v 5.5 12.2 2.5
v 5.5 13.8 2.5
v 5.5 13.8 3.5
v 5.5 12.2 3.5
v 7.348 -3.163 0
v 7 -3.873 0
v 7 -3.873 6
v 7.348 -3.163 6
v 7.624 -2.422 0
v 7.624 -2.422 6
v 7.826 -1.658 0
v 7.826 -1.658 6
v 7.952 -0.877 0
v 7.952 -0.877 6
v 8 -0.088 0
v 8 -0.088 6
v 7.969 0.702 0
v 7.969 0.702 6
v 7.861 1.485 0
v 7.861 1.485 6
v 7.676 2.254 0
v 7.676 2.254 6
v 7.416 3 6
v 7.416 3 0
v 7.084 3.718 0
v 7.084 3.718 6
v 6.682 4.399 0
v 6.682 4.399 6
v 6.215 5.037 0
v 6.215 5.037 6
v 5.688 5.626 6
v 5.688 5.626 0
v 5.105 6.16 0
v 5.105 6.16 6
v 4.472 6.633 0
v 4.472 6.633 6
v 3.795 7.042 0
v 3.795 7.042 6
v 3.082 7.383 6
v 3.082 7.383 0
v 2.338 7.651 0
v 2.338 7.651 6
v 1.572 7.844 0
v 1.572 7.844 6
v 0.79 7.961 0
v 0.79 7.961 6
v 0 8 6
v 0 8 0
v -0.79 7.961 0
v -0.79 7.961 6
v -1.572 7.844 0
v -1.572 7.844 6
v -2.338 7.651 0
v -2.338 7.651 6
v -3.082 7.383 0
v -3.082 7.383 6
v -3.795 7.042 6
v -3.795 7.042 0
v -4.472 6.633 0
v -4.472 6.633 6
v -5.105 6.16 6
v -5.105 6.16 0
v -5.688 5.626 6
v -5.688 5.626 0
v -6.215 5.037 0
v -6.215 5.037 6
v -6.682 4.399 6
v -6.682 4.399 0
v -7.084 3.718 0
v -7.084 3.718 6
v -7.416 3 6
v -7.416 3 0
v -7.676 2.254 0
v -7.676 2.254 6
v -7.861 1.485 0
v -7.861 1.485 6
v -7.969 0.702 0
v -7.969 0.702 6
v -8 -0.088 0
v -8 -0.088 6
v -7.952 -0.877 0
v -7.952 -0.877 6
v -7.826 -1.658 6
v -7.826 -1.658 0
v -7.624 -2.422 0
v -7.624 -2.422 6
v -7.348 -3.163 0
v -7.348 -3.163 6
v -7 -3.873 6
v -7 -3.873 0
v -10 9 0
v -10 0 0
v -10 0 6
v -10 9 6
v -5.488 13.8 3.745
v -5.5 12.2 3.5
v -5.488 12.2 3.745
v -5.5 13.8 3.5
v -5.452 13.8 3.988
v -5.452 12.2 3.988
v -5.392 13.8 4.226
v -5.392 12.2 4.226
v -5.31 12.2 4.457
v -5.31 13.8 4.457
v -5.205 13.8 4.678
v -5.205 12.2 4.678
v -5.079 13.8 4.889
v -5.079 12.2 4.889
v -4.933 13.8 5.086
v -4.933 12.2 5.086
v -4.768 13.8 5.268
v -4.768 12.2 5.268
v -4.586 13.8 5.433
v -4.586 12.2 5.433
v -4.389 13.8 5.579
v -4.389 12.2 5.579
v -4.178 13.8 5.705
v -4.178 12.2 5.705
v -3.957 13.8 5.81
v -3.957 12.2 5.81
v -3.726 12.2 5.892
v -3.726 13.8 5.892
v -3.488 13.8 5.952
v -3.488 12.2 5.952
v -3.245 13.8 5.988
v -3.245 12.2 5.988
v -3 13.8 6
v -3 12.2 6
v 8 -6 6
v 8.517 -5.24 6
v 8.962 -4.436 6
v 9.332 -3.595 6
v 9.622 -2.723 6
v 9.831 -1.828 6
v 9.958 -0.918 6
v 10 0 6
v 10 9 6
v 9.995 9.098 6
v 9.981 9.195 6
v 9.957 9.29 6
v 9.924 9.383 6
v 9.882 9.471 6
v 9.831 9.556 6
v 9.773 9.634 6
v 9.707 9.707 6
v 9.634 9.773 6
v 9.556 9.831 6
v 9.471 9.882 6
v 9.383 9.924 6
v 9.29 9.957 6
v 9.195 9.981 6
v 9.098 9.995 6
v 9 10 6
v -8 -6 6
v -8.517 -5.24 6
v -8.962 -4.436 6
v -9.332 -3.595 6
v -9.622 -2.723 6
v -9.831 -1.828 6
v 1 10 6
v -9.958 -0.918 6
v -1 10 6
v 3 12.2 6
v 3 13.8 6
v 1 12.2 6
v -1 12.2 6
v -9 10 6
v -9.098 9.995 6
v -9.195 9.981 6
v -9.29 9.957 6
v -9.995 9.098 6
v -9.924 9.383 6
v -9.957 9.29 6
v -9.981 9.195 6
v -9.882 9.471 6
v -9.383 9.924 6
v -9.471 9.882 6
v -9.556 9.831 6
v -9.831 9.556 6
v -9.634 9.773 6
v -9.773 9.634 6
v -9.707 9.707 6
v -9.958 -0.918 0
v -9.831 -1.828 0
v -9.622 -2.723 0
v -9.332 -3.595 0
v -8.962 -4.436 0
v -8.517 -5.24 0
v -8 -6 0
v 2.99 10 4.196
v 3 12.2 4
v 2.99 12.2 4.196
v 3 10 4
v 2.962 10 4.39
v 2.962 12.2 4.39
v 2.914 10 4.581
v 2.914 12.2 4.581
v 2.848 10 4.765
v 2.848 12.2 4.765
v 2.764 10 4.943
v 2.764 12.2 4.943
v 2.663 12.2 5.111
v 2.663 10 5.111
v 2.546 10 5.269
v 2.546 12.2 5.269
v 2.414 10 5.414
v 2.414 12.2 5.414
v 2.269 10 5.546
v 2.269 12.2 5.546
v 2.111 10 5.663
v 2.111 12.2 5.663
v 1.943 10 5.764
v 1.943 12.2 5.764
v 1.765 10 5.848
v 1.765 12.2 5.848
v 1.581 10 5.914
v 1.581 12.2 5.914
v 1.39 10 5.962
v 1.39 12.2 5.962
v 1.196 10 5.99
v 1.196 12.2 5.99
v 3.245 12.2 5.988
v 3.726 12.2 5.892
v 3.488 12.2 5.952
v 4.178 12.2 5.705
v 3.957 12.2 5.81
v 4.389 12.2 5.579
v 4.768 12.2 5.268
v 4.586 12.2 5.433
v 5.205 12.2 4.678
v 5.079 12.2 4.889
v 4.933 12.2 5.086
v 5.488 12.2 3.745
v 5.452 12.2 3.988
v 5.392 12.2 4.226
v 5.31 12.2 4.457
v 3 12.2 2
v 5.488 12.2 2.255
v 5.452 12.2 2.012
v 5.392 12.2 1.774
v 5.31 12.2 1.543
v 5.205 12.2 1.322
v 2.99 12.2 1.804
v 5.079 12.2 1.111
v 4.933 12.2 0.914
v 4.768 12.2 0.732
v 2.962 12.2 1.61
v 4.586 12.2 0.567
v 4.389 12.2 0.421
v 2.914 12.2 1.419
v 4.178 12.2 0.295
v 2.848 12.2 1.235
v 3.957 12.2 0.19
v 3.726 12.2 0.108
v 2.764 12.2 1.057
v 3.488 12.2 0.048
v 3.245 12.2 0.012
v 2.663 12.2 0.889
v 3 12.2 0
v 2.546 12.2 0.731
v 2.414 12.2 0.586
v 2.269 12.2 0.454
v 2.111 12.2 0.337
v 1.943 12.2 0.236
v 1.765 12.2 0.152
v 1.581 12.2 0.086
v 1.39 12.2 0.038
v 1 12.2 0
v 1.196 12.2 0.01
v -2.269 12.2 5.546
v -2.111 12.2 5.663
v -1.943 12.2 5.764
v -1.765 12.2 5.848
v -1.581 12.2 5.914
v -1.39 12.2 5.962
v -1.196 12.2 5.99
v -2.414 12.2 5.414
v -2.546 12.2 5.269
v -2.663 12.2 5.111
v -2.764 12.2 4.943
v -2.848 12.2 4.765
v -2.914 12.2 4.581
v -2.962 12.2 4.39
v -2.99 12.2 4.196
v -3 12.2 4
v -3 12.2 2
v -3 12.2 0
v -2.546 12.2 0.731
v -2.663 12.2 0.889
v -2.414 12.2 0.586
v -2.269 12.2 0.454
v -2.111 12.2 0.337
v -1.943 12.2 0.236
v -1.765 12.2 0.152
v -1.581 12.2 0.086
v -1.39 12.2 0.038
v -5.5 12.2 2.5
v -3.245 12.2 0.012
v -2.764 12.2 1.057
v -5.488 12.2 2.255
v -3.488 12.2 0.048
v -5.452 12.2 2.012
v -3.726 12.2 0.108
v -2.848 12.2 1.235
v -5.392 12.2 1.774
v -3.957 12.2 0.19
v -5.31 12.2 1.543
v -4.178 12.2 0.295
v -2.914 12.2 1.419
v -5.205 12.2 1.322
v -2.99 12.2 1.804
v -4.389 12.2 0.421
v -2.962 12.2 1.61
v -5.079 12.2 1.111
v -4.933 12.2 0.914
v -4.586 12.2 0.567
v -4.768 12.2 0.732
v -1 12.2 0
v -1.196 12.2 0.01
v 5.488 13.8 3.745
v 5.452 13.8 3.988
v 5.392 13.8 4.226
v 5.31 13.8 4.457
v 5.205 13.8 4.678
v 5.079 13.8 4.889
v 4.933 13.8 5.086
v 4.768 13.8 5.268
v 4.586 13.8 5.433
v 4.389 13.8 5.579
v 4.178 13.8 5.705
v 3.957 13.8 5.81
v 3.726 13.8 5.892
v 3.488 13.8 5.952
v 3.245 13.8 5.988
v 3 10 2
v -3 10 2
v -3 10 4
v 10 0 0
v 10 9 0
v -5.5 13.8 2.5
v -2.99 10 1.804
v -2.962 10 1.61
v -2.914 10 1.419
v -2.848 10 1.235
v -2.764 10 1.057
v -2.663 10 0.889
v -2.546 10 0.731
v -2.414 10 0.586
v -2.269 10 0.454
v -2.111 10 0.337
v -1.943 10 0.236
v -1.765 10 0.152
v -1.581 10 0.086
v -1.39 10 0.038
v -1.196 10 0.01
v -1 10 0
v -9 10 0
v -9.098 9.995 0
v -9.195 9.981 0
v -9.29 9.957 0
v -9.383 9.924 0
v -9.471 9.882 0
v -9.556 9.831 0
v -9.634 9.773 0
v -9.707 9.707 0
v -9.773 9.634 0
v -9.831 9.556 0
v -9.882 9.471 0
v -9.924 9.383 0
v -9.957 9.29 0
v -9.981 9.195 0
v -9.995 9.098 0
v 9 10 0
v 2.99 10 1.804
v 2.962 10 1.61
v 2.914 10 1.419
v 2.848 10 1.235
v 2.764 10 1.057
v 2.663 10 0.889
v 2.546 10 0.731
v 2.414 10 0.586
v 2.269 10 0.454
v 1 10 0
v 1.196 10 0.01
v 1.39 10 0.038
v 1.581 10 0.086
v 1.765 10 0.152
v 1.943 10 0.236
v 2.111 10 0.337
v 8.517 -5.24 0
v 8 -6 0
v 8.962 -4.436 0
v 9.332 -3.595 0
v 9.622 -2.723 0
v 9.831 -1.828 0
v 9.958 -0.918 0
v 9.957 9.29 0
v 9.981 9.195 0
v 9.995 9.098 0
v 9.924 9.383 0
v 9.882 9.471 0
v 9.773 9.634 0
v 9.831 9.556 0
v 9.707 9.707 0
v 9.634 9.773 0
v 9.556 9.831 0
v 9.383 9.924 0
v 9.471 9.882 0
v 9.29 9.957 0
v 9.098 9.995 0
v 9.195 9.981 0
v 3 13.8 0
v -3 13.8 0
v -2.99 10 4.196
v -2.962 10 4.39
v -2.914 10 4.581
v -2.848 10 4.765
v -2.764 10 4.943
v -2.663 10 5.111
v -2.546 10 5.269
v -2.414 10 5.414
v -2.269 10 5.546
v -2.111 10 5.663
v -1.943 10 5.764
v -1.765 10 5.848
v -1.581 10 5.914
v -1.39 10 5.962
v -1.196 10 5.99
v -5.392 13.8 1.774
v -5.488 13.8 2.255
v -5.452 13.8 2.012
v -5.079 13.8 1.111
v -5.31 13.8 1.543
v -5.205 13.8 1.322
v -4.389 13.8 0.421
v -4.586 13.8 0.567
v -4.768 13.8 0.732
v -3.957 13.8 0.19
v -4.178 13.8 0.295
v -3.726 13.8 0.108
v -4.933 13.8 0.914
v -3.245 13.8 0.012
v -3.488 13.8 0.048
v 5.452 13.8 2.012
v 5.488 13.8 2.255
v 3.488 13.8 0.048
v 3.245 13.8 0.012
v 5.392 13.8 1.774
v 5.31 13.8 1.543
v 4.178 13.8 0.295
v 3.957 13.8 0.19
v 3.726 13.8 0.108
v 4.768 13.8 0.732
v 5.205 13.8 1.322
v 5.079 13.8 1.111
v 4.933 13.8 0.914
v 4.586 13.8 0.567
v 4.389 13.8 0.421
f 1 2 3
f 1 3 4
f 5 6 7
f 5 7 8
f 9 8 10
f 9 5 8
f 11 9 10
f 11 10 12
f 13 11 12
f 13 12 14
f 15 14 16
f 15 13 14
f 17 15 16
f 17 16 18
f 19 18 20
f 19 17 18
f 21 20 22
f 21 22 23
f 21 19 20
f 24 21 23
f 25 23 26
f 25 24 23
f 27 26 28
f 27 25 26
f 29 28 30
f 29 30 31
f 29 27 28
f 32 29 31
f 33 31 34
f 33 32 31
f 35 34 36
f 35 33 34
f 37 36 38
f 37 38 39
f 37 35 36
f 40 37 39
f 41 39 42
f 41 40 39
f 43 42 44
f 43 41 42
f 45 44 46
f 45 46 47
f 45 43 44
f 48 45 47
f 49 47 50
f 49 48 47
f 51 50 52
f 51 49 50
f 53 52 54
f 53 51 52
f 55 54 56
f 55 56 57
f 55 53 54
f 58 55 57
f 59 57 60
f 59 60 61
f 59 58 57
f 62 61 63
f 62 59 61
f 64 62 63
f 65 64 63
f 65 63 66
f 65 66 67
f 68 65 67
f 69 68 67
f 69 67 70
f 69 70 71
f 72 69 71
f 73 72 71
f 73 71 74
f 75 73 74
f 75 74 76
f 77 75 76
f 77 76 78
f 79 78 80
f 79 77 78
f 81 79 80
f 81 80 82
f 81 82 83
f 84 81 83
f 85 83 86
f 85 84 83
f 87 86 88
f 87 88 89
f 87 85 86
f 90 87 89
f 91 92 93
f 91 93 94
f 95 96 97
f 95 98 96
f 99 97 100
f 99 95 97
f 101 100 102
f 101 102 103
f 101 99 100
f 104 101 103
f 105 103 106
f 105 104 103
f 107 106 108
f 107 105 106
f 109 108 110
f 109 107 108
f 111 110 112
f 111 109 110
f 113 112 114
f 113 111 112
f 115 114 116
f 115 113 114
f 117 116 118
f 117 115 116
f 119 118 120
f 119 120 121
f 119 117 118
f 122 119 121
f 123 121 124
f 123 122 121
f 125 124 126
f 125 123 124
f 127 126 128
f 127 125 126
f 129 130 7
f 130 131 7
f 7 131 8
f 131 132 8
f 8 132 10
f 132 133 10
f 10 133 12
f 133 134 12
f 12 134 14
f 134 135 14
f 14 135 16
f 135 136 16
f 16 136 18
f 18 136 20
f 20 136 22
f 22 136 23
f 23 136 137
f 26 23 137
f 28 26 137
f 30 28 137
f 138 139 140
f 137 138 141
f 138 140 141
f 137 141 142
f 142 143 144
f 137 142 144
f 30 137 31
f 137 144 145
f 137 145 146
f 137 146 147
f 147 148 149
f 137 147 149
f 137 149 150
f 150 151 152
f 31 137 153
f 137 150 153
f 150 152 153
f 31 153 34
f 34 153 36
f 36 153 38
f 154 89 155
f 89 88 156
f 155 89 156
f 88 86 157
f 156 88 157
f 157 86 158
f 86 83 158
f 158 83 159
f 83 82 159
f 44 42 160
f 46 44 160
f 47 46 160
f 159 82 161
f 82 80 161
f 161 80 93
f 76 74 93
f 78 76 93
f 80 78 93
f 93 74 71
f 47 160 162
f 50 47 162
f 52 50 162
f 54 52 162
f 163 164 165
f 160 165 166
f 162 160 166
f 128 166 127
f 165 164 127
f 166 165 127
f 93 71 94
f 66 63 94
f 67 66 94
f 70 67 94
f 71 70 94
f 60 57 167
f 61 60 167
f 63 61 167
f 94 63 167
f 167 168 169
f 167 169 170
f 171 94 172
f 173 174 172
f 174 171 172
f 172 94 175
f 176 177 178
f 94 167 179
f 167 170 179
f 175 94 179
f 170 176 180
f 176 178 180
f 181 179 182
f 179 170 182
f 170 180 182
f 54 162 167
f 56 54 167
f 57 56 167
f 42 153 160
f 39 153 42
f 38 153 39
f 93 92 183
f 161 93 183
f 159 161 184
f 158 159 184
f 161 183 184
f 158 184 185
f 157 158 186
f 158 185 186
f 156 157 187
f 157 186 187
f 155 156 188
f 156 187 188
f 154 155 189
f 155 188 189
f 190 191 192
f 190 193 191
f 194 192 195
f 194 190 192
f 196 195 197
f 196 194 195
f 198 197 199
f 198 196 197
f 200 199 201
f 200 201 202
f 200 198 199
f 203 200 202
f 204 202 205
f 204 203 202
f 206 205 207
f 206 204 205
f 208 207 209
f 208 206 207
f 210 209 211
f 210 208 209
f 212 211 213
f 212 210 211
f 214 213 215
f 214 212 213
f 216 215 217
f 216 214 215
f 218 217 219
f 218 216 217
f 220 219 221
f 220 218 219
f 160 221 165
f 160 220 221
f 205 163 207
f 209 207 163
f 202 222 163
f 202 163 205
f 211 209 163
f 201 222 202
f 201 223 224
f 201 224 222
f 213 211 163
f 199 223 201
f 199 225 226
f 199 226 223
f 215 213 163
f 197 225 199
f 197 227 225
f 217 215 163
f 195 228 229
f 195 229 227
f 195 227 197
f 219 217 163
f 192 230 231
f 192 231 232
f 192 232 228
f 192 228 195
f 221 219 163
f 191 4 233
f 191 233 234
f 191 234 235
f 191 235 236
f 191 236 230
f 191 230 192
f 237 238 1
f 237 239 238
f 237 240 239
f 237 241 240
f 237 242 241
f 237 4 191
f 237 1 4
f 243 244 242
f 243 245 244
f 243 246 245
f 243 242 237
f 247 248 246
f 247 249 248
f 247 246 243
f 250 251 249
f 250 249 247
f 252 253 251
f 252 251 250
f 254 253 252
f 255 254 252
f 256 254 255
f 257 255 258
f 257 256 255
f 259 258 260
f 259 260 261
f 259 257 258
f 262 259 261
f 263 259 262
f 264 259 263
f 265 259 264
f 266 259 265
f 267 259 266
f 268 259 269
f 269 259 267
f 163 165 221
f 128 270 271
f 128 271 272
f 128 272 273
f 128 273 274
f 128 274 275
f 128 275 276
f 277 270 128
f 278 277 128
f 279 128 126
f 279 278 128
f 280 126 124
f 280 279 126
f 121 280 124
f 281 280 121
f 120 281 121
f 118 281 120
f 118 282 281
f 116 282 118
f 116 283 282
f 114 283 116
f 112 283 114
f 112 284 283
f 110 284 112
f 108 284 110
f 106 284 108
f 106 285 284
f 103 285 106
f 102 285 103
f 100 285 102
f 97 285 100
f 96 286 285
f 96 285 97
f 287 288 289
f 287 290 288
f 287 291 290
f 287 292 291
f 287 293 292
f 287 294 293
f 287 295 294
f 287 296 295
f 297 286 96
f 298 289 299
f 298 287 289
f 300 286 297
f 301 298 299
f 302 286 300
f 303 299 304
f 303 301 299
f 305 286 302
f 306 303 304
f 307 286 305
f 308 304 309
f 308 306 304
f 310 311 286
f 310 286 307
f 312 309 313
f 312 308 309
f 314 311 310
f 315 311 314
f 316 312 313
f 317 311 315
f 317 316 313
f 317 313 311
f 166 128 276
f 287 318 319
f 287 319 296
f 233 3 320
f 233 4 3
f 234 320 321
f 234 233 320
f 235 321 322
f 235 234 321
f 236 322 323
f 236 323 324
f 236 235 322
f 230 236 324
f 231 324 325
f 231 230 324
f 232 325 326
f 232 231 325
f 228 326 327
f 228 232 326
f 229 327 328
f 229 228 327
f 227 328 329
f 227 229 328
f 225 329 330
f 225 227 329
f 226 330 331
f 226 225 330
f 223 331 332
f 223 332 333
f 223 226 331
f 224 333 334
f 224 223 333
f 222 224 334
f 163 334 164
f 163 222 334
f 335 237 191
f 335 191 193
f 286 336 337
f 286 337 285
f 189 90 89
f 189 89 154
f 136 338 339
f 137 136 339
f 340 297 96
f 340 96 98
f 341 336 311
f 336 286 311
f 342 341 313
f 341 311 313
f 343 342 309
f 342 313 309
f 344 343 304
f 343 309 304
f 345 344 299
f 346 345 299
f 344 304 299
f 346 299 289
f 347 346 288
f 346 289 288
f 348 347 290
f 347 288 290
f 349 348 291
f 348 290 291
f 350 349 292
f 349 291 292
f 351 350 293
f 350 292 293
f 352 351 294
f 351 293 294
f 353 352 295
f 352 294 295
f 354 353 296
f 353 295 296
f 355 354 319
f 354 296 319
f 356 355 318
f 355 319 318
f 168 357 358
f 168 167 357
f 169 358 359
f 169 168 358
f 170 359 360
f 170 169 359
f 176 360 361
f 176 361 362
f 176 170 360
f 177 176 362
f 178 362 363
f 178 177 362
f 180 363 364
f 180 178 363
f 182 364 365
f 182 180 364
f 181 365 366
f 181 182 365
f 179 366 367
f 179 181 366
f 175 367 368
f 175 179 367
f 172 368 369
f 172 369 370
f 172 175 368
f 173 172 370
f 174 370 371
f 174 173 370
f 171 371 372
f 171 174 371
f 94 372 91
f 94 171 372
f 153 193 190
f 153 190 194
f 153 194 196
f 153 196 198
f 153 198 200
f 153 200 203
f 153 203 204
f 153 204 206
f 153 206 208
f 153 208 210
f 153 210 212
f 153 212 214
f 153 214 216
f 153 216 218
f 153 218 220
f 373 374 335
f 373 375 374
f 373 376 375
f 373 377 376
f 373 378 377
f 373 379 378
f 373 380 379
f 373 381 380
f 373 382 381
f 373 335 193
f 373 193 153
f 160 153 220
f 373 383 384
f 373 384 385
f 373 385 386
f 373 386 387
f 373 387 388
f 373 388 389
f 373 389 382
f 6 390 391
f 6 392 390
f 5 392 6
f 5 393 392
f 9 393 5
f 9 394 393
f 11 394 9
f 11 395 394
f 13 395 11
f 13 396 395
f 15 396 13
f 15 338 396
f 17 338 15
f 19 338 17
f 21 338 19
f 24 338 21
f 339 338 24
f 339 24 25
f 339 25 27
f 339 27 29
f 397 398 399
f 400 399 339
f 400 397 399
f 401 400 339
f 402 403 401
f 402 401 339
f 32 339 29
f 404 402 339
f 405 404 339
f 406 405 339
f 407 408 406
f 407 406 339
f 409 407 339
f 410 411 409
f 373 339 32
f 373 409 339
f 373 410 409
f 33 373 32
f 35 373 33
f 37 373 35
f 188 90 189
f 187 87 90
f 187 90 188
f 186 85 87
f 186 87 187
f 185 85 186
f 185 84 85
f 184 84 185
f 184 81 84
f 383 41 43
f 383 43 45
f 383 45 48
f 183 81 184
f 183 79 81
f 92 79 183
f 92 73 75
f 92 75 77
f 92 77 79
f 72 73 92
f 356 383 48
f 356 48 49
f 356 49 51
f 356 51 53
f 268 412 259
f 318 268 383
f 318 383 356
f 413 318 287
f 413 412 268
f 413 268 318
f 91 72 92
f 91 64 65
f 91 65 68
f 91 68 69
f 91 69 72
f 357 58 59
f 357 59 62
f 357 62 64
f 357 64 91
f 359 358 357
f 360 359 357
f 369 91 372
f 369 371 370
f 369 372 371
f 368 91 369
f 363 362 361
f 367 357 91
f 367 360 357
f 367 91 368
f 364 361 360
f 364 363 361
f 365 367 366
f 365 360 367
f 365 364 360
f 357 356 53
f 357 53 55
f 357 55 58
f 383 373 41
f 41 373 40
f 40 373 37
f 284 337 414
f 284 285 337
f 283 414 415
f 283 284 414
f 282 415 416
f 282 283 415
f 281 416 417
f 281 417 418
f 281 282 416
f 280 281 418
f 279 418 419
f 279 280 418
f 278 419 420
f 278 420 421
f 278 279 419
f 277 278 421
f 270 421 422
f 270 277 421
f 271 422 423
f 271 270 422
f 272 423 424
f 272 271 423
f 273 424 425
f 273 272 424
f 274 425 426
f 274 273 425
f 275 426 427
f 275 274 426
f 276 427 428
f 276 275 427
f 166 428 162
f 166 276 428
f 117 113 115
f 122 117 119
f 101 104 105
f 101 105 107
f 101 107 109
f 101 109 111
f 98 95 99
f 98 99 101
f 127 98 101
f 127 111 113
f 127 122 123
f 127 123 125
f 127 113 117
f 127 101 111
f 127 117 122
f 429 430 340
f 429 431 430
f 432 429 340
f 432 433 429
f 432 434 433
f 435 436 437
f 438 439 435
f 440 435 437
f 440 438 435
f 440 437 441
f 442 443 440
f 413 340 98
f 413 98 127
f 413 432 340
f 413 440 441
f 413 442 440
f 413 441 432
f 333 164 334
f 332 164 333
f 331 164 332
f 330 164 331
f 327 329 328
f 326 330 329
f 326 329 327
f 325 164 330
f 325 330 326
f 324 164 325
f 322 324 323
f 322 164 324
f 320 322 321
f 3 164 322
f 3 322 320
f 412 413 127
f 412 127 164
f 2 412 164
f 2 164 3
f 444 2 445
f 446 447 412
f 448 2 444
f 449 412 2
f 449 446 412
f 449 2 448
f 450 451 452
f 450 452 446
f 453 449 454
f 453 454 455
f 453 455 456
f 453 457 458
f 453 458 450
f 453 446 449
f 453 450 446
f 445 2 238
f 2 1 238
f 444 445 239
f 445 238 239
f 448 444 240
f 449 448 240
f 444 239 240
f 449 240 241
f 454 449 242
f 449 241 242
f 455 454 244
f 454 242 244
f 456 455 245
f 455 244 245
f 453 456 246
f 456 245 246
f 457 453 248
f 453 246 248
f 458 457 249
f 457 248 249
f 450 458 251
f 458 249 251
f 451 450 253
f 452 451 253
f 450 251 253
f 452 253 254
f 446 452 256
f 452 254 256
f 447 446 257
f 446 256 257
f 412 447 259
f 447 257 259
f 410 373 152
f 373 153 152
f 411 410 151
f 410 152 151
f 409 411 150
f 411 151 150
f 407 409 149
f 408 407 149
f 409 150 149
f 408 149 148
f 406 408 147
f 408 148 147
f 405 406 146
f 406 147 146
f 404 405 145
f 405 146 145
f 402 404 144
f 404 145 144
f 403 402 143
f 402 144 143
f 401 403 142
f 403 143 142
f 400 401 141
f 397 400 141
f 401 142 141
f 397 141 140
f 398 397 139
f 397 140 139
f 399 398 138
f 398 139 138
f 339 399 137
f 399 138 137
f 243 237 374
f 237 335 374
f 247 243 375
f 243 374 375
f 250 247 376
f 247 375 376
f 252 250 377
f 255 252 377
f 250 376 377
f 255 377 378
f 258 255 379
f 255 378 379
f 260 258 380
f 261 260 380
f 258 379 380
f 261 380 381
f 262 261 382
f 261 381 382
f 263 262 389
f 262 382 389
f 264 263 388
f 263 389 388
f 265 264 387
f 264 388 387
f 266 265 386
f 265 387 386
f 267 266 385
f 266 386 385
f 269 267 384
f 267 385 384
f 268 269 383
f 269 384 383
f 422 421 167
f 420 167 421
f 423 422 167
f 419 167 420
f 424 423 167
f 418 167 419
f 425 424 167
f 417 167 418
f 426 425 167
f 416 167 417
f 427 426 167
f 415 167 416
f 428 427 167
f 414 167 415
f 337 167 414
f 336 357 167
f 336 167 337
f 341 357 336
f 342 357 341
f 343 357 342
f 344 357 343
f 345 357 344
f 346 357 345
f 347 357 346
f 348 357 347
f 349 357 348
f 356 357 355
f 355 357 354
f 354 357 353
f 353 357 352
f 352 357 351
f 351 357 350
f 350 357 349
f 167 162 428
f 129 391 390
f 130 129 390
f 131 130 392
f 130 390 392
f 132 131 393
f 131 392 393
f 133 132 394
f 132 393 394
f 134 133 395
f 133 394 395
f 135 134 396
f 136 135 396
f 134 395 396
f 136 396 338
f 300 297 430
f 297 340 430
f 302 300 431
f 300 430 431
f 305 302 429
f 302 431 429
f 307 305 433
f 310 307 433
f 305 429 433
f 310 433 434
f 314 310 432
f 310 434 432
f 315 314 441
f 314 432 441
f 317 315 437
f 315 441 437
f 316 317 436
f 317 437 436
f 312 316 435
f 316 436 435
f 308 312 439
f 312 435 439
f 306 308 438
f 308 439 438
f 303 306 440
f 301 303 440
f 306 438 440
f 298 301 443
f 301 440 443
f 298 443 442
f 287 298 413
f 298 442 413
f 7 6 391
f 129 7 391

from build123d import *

# Parameters (mm, degrees)
PAD003_DEPTH = 6
FILLET_R     = 2
FILLET001_R  = 2.5
FILLET002_R  = 1


with BuildPart() as part:
    # Sketch023 → Pad003 (new body)
    with BuildSketch(Plane.XY):
        with BuildLine():
            ThreePointArc((7, -3.872983), (0, 8), (-7, -3.872983))
            Line((-7, -3.872983), (-8, -6))
            ThreePointArc((-10, 0), (-9.486833, -3.162278), (-8, -6))
            Line((-10, 0), (-10, 10))
            Line((-10, 10), (-3, 10))
            Line((-3, 10), (-3, 12.2))
            Line((-3, 12.2), (-5.5, 12.2))
            Line((-5.5, 12.2), (-5.5, 13.8))
            Line((-5.5, 13.8), (5.5, 13.8))
            Line((5.5, 13.8), (5.5, 12.2))
            Line((5.5, 12.2), (3, 12.2))
            Line((3, 12.2), (3, 10))
            Line((3, 10), (10, 10))
            Line((10, 0), (10, 10))
            ThreePointArc((8, -6), (9.486833, -3.162278), (10, 0))
            Line((7, -3.872983), (8, -6))
        make_face()
    extrude(amount=PAD003_DEPTH)

    # Fillet
    fillet_edges = [part.edges().sort_by_distance(p)[0] for p in [
        (-3, 11.1, 0),
        (-3, 11.1, 6),
        (3, 11.1, 6),
        (3, 11.1, 0),
    ]]
    fillet(fillet_edges, radius=FILLET_R)

    # Fillet001
    fillet001_edges = [part.edges().sort_by_distance(p)[0] for p in [
        (5.5, 13, 6),
        (5.5, 13, 0),
        (-5.5, 13, 6),
        (-5.5, 13, 0),
    ]]
    fillet(fillet001_edges, radius=FILLET001_R)

    # Fillet002
    fillet002_edges = [part.edges().sort_by_distance(p)[0] for p in [
        (10, 10, 3),
        (-10, 10, 3),
    ]]
    fillet(fillet002_edges, radius=FILLET002_R)


solid = part.part
